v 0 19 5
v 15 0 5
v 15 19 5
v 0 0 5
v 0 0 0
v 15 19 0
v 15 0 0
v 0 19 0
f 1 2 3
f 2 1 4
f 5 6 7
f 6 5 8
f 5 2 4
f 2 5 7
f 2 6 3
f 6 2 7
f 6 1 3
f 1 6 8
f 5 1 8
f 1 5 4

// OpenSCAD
// Generated by SolidPython 1.0.1 on 2020-07-29 00:46:56


cube(size = [15, 19, 5]);
/***********************************************
*********      SolidPython code:      **********
************************************************
 
# import packages: SolidPython
from solid import *
from solid.utils import *
from itertools import chain, combinations, permutations


class Resize:

    def __init__(self, scad_file):
        self.scad_file = scad_file
        #self.scad_file = import_scad(scad_file)
        # cone/cylinder param:
        self.r1 = 0
        self.r2 = 0
        self.h = 0
        # rectangular prism param:
        self.w = 0
        self.l = 0
        # ellipse param:
        self.r = 0

    # import OpenScad code (file name corresponds to shape)


    # classify shape + parameters
    def assign(self, param1, param2, param3):
        if self.scad_file == 'cone.scad':
            self.r1 = param1
            self.r2 = param2
            self.h = param3
        elif self.scad_file == 'cylinder.scad':
            self.r1 = param1
            self.r2 = param2
            self.h = param3
        elif self.scad_file == 'rectangularPrism.scad':
            self.h = param1
            self.l = param2
            self.w = param3
        else:
            self.r = param1
            self.h = param2

    # resize parameters
    def iterate(self):
        x = range(3, 20, 2)
        i = 1
        if self.scad_file == 'cone.scad':
            tempList = list(permutations(x, 2))
            for temp in tempList:
                param1 = temp[0]
                param2 = temp[1]
                filepath = 'produced_scad_files/' + 'cone' + str(param1) + '_' + str(param2) + '_' + '.scad'
                scad_render_to_file(cylinder(h=param1, r1=param2, r2=0), filepath)

        elif self.scad_file == 'cylinder.scad':
            tempList = list(permutations(x, 3))
            for temp in tempList:
                param1 = temp[0]
                param2 = temp[1]
                filepath = 'produced_scad_files/' + 'cylinder' + str(param1) + '_' + str(param2) + '_' + '.scad'
                scad_render_to_file(cylinder(h=param1, r1=param2, r2=param2), filepath)

        elif self.scad_file == 'rectangularPrism.scad':
            tempList = list(permutations(x, 3))
            for temp in tempList:
                param1 = temp[0]
                param2 = temp[1]
                param3 = temp[2]
                filepath = 'produced_scad_files/' + 'rectangularPrism' + str(param1) + '_' + str(param2) + '_' + str(
                    param3) + '.scad'
                scad_render_to_file(cube(size=(param1, param2, param3)), filepath)

        elif self.scad_file == 'ellipse.scad':
            tempList = list(permutations(x, 4))
            for temp in tempList:
                param1 = temp[0]
                param2 = temp[1]
                param3 = temp[2]
                param4 = temp[3]
                filepath = 'produced_scad_files/' + 'ellipse' + str(param1) + '_' + str(param2) + '_' + str(param3) + '_' + str(param4) + '.scad'
                scad_render_to_file(scale([param1, param2, param3])(sphere(r=param4)), filepath)

    def render_to_scadfile(self):
        scad_render_to_file(scad, 'example.scad') 
 
************************************************/
